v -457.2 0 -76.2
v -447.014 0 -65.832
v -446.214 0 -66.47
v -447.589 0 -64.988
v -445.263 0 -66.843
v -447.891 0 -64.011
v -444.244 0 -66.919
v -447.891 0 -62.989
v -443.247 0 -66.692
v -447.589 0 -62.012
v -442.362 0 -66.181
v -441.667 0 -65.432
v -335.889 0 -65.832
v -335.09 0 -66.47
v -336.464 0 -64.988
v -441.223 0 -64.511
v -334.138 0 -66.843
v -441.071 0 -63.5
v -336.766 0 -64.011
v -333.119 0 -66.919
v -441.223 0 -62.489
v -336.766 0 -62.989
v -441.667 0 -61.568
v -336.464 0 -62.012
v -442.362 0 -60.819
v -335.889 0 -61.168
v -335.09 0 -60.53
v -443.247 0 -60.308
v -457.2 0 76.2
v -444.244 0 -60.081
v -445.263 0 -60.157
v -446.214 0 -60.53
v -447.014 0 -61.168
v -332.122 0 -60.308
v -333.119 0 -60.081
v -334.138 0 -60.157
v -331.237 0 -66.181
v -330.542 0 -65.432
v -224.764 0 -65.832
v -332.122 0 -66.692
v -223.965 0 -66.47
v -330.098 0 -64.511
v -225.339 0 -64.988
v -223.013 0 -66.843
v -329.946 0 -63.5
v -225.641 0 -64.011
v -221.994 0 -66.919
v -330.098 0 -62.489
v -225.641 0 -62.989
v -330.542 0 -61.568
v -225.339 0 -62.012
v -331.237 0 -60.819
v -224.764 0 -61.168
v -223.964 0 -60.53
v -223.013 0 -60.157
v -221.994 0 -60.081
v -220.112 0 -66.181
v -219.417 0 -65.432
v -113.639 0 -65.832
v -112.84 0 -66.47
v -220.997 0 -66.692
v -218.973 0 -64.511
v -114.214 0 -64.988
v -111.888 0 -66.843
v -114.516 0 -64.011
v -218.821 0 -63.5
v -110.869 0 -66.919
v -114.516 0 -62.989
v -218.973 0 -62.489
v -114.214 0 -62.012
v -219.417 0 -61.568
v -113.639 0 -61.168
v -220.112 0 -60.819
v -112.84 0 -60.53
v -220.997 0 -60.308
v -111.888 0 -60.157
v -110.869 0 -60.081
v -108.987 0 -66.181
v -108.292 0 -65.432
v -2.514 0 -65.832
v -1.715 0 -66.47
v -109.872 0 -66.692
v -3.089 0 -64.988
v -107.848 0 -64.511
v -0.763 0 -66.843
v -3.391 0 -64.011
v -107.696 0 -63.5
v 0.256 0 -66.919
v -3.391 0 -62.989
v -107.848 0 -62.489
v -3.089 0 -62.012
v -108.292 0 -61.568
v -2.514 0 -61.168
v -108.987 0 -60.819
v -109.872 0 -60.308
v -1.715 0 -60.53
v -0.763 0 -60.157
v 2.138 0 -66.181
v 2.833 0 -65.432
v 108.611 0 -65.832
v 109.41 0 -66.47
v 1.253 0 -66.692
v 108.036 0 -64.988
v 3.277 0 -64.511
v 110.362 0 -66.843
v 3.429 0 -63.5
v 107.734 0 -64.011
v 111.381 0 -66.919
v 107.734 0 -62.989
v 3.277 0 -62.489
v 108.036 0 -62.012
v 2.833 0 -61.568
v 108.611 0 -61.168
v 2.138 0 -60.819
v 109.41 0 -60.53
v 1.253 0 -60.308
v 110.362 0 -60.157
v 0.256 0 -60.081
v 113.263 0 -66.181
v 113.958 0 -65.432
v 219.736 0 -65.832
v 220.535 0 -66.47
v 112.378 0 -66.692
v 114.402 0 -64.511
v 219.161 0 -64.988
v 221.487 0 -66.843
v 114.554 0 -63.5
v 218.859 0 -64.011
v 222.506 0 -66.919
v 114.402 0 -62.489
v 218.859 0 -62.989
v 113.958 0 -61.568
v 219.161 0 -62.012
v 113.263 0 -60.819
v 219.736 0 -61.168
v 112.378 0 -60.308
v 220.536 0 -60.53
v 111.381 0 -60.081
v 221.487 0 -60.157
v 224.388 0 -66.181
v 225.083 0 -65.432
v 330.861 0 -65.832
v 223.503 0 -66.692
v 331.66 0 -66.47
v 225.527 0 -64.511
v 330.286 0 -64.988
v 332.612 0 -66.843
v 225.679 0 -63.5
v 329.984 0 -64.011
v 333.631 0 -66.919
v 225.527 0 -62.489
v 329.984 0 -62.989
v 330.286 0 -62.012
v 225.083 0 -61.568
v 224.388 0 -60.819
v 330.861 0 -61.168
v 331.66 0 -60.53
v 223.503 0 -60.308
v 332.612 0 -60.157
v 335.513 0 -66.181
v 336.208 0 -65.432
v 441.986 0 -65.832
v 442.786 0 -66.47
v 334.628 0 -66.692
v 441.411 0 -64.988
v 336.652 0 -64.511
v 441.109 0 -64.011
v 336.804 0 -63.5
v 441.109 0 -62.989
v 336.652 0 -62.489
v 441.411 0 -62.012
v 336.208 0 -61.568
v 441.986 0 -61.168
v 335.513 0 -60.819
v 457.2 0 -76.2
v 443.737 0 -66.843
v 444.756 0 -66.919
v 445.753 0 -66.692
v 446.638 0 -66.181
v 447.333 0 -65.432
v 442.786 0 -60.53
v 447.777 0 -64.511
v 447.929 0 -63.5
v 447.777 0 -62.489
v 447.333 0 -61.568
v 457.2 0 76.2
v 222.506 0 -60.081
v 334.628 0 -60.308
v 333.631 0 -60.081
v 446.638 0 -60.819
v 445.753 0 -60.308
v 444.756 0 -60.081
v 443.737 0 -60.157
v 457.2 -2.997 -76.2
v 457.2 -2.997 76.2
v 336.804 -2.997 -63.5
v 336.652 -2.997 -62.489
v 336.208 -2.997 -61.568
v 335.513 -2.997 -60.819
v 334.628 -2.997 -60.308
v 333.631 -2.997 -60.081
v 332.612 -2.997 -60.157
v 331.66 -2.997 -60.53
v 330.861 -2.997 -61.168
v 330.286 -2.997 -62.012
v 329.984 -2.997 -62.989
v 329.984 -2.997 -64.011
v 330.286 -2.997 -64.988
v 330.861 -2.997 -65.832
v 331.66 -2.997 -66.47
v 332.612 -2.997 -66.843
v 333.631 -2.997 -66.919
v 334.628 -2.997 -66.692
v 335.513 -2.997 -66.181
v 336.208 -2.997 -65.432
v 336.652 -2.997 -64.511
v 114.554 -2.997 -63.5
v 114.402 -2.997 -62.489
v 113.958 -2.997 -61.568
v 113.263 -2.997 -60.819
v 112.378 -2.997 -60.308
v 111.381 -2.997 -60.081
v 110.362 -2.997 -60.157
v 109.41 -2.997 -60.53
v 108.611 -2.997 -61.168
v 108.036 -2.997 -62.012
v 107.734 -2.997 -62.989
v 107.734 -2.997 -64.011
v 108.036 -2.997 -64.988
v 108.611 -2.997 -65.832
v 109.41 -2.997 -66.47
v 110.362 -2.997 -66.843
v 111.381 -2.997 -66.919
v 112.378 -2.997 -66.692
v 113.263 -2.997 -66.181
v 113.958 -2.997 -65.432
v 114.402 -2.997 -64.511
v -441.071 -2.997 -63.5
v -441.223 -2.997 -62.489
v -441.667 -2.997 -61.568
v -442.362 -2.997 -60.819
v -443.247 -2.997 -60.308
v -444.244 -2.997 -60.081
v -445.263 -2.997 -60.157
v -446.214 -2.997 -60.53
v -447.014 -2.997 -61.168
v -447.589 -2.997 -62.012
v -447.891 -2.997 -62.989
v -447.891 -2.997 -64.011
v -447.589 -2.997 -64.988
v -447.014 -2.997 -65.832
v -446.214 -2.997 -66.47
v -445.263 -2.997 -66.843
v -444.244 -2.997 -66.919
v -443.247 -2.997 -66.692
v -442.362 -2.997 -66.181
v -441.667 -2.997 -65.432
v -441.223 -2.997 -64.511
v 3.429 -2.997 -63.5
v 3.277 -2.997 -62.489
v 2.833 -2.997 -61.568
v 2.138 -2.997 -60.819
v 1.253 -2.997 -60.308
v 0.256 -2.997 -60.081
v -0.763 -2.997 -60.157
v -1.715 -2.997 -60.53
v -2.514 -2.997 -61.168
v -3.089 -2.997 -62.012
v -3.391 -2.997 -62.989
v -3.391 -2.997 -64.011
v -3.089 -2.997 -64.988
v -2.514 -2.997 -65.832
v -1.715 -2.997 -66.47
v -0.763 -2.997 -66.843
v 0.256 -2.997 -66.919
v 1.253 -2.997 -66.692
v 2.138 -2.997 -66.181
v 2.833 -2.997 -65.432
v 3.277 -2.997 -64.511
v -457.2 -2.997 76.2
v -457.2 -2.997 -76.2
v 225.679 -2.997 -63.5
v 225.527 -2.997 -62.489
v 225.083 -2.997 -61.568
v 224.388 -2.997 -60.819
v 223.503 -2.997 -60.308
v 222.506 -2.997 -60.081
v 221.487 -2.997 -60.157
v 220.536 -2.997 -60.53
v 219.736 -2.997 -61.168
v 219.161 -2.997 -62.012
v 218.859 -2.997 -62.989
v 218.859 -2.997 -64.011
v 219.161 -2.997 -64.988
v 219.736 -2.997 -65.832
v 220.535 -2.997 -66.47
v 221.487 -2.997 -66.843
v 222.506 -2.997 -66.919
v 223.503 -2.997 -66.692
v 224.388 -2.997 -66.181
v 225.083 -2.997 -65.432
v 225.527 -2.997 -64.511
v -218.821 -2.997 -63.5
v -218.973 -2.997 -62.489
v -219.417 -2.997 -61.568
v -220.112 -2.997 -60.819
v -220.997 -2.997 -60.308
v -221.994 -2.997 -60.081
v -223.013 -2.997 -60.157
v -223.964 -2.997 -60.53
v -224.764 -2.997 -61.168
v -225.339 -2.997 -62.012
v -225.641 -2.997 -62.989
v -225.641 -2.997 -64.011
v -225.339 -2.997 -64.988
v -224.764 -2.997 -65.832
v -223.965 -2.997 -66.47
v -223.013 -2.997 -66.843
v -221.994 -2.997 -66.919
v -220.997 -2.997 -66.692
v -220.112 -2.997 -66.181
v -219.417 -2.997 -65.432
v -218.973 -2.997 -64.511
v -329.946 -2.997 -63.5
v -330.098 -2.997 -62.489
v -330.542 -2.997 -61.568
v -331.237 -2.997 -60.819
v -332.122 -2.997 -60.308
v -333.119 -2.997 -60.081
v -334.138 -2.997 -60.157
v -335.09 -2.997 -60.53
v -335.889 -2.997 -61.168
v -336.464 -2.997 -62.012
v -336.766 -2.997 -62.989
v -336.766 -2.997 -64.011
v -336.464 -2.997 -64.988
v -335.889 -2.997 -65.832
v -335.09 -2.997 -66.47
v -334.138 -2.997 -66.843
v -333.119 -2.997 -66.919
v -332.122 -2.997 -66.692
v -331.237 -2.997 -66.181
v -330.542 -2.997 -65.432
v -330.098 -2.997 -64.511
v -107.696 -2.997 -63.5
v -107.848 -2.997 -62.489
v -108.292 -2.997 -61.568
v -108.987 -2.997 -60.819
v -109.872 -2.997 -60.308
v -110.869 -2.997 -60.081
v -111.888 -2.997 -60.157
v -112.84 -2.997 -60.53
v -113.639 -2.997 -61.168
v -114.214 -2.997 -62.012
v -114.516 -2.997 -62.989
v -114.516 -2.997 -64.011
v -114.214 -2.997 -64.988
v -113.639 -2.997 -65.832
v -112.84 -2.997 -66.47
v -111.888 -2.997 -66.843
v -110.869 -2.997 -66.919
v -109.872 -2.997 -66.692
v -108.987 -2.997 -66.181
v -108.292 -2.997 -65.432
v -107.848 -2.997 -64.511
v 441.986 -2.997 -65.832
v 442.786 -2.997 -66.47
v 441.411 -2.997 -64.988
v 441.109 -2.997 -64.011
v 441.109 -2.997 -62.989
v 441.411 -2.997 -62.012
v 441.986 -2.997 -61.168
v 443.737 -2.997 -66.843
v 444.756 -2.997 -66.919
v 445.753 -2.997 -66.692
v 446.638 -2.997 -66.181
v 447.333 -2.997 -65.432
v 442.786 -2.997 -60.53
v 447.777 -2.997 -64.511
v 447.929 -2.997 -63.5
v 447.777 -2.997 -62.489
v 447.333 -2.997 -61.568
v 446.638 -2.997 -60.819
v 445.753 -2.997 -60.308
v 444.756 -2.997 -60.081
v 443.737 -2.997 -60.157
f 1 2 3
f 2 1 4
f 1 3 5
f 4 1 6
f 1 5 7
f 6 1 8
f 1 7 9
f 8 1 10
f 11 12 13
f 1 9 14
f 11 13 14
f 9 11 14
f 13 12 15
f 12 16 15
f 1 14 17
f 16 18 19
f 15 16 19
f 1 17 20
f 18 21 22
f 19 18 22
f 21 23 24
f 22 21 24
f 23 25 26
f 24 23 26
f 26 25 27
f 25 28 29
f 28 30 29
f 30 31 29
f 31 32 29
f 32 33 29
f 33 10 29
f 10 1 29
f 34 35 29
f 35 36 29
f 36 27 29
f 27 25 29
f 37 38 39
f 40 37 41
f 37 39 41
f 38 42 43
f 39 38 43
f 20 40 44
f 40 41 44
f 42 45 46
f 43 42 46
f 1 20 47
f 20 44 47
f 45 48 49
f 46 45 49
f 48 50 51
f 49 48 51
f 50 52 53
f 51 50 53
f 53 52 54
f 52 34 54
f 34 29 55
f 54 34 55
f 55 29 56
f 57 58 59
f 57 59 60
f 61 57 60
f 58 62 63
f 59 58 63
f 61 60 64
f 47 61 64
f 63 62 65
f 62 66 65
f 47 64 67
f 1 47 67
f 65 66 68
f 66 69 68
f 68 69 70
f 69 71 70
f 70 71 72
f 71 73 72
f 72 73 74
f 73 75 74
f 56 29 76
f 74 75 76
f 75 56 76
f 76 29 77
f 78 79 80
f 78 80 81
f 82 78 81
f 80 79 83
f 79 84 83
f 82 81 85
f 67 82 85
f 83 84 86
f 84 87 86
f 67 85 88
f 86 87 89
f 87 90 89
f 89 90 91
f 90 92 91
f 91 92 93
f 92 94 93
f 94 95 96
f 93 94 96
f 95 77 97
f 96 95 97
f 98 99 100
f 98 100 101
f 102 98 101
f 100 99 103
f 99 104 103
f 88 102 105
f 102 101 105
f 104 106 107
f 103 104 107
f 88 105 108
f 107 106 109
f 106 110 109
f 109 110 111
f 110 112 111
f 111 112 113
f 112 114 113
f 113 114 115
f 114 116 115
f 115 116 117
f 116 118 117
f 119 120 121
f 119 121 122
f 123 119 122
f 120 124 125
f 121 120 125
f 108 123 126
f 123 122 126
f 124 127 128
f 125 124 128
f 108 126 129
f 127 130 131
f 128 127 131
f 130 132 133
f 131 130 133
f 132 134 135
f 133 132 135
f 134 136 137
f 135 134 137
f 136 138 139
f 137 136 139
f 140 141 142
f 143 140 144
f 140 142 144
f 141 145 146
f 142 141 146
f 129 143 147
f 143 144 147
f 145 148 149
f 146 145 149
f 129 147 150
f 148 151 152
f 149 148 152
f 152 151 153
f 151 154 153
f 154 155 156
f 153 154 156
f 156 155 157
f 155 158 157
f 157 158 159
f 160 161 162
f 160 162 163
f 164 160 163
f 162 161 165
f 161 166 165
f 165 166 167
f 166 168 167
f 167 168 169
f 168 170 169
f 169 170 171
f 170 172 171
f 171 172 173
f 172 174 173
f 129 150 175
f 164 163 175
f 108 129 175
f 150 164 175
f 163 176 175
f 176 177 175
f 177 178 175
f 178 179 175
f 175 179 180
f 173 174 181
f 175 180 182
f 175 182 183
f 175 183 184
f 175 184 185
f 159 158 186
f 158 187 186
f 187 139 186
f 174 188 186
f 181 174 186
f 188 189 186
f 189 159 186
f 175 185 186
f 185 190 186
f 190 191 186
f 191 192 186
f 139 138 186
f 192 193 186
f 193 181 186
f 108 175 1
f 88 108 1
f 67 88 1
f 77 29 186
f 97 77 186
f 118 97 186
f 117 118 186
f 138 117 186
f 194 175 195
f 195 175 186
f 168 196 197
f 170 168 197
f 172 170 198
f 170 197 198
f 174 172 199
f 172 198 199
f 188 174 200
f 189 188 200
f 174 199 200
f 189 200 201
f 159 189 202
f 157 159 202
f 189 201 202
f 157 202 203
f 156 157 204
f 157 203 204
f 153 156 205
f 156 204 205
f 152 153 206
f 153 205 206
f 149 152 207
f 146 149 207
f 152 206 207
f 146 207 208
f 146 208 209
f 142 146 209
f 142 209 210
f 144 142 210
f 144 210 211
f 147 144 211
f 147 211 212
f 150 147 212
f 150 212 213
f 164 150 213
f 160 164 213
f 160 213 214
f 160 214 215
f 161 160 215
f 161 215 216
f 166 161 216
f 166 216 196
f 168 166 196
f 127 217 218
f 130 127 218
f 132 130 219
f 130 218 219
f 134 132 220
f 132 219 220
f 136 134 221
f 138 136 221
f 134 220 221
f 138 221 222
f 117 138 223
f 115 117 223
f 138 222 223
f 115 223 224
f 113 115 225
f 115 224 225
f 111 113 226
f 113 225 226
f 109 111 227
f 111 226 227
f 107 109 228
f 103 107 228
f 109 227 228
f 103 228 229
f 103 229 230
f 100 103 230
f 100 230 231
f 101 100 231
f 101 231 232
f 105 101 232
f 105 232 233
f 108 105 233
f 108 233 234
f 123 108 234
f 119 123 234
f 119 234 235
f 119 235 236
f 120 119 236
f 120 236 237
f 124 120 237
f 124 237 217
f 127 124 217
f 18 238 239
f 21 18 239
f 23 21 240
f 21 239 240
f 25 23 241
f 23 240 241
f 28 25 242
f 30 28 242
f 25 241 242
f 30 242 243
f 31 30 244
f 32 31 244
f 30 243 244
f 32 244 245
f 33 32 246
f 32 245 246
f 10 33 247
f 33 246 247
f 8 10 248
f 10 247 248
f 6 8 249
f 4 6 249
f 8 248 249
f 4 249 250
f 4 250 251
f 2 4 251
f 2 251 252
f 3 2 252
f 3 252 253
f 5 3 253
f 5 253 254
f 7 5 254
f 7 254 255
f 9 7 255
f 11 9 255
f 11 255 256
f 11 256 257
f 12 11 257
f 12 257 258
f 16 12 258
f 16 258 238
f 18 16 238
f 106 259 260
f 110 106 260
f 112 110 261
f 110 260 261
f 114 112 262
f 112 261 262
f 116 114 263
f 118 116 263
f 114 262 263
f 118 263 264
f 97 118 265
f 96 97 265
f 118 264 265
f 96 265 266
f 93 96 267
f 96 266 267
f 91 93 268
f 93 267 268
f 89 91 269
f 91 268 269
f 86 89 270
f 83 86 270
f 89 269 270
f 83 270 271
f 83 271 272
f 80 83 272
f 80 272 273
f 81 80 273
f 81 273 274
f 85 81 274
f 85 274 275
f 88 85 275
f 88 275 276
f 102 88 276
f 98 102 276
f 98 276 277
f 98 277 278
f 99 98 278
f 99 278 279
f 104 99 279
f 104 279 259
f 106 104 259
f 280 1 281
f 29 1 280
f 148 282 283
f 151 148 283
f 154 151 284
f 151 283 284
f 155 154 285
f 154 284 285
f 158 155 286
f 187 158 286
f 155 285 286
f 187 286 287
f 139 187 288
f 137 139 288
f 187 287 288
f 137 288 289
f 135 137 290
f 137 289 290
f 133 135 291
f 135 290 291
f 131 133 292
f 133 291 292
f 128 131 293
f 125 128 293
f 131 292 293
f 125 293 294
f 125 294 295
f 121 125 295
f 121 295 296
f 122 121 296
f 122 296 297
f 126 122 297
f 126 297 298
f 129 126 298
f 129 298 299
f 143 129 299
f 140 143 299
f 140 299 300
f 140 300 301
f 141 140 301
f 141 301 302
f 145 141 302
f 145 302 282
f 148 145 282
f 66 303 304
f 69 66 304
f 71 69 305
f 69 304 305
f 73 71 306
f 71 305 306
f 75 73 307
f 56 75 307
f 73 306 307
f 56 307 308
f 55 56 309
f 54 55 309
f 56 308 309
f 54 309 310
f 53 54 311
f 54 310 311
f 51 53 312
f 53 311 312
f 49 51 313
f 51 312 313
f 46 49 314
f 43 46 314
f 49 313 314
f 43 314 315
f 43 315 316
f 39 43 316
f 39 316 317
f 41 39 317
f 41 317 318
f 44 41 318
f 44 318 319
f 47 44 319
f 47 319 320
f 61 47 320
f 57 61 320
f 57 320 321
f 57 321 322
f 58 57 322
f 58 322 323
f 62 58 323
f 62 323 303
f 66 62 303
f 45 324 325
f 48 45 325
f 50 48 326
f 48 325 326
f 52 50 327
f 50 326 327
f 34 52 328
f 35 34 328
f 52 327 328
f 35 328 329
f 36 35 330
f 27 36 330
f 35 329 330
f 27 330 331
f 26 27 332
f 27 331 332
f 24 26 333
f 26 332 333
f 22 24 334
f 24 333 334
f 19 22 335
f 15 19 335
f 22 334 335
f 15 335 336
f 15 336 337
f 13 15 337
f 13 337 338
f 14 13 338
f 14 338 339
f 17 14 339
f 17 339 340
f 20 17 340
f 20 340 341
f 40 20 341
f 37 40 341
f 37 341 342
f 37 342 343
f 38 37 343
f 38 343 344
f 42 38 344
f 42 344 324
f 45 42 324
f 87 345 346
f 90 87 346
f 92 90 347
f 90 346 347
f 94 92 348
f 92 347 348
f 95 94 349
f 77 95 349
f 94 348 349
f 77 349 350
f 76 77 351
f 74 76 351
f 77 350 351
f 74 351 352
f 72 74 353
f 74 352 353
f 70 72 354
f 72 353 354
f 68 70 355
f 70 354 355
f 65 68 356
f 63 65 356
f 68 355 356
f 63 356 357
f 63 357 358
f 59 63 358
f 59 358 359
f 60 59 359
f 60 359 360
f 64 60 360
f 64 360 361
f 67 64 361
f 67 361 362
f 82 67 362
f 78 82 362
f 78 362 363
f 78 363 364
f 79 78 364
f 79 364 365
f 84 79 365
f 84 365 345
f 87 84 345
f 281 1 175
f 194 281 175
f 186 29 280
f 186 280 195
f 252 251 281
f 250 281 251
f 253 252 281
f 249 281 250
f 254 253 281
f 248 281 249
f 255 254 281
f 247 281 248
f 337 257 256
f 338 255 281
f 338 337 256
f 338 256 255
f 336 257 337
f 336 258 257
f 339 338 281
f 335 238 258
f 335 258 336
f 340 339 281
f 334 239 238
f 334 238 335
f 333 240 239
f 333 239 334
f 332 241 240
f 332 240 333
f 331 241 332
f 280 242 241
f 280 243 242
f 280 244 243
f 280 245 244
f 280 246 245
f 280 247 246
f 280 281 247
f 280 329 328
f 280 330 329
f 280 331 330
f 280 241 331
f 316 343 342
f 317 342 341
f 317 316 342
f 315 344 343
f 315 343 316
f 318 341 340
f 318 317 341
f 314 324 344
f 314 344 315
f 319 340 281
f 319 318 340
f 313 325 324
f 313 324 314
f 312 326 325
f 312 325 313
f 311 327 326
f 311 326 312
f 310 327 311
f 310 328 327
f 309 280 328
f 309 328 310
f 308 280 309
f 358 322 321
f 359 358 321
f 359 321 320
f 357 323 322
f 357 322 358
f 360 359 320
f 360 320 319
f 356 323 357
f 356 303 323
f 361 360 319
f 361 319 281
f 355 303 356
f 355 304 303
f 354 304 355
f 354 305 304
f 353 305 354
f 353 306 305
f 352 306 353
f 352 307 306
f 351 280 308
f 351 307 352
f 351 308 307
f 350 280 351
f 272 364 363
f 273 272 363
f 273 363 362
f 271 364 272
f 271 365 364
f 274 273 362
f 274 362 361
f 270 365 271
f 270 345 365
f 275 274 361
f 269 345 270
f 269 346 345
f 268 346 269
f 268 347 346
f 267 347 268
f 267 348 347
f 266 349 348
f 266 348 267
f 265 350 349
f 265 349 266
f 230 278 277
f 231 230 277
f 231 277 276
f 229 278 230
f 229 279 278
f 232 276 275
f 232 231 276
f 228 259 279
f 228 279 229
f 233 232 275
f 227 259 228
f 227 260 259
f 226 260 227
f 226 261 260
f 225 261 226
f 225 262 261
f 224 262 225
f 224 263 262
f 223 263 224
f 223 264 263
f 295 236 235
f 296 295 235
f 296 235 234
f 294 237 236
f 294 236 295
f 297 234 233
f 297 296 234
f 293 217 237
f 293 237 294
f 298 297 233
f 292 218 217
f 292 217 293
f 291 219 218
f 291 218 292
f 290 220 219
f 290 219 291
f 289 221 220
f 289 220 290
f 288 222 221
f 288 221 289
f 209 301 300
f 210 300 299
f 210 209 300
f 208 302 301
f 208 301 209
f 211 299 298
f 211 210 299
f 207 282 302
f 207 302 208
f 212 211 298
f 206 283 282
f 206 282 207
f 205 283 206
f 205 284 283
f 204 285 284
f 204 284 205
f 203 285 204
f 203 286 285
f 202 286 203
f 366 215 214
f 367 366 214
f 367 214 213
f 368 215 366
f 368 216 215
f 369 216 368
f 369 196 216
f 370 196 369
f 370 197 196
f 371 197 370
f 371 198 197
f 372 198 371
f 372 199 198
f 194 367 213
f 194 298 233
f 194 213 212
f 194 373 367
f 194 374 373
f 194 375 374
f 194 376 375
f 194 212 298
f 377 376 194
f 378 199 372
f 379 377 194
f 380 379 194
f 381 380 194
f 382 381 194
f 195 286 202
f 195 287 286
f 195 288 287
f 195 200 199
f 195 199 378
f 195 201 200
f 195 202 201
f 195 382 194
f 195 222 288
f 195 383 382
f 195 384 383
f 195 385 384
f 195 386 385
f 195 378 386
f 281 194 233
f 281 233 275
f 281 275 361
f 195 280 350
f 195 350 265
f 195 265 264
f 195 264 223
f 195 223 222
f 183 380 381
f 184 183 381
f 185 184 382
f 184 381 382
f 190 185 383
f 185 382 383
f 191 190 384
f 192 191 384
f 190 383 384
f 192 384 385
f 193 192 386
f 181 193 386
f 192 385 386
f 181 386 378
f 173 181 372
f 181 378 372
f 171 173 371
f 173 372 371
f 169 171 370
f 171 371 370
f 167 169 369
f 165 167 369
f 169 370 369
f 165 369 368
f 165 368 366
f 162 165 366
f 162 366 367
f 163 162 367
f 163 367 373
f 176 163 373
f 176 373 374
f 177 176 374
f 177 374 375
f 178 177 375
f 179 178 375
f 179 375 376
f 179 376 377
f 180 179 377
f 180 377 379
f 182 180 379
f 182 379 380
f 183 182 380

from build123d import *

# Parameters (mm, degrees)
F0_W     = 914.4
F0_H     = 152.4
F1_DEPTH = 2.9972
F2_R     = 3.429
F3_DEPTH = 2.9982


with BuildPart() as f1:
    # F0 (on Front) → F1 (new body)
    with BuildSketch(Plane.XZ):
        Rectangle(F0_W, F0_H)
    extrude(amount=F1_DEPTH)

    # F2 (on face) → F3 (cut, through all)
    with BuildSketch(Plane.XZ.offset(2.9972)):
        with Locations((-444.5, -63.5)):
            Circle(F2_R)
        with Locations((-333.375, -63.5)):
            Circle(F2_R)
        with Locations((-222.25, -63.5)):
            Circle(F2_R)
        with Locations((-111.125, -63.5)):
            Circle(F2_R)
        with Locations((0, -63.5)):
            Circle(F2_R)
        with Locations((111.125, -63.5)):
            Circle(F2_R)
        with Locations((222.25, -63.5)):
            Circle(F2_R)
        with Locations((333.375, -63.5)):
            Circle(F2_R)
        with Locations((444.5, -63.5)):
            Circle(F2_R)
    extrude(amount=-F3_DEPTH, mode=Mode.SUBTRACT)


solid = f1.part
